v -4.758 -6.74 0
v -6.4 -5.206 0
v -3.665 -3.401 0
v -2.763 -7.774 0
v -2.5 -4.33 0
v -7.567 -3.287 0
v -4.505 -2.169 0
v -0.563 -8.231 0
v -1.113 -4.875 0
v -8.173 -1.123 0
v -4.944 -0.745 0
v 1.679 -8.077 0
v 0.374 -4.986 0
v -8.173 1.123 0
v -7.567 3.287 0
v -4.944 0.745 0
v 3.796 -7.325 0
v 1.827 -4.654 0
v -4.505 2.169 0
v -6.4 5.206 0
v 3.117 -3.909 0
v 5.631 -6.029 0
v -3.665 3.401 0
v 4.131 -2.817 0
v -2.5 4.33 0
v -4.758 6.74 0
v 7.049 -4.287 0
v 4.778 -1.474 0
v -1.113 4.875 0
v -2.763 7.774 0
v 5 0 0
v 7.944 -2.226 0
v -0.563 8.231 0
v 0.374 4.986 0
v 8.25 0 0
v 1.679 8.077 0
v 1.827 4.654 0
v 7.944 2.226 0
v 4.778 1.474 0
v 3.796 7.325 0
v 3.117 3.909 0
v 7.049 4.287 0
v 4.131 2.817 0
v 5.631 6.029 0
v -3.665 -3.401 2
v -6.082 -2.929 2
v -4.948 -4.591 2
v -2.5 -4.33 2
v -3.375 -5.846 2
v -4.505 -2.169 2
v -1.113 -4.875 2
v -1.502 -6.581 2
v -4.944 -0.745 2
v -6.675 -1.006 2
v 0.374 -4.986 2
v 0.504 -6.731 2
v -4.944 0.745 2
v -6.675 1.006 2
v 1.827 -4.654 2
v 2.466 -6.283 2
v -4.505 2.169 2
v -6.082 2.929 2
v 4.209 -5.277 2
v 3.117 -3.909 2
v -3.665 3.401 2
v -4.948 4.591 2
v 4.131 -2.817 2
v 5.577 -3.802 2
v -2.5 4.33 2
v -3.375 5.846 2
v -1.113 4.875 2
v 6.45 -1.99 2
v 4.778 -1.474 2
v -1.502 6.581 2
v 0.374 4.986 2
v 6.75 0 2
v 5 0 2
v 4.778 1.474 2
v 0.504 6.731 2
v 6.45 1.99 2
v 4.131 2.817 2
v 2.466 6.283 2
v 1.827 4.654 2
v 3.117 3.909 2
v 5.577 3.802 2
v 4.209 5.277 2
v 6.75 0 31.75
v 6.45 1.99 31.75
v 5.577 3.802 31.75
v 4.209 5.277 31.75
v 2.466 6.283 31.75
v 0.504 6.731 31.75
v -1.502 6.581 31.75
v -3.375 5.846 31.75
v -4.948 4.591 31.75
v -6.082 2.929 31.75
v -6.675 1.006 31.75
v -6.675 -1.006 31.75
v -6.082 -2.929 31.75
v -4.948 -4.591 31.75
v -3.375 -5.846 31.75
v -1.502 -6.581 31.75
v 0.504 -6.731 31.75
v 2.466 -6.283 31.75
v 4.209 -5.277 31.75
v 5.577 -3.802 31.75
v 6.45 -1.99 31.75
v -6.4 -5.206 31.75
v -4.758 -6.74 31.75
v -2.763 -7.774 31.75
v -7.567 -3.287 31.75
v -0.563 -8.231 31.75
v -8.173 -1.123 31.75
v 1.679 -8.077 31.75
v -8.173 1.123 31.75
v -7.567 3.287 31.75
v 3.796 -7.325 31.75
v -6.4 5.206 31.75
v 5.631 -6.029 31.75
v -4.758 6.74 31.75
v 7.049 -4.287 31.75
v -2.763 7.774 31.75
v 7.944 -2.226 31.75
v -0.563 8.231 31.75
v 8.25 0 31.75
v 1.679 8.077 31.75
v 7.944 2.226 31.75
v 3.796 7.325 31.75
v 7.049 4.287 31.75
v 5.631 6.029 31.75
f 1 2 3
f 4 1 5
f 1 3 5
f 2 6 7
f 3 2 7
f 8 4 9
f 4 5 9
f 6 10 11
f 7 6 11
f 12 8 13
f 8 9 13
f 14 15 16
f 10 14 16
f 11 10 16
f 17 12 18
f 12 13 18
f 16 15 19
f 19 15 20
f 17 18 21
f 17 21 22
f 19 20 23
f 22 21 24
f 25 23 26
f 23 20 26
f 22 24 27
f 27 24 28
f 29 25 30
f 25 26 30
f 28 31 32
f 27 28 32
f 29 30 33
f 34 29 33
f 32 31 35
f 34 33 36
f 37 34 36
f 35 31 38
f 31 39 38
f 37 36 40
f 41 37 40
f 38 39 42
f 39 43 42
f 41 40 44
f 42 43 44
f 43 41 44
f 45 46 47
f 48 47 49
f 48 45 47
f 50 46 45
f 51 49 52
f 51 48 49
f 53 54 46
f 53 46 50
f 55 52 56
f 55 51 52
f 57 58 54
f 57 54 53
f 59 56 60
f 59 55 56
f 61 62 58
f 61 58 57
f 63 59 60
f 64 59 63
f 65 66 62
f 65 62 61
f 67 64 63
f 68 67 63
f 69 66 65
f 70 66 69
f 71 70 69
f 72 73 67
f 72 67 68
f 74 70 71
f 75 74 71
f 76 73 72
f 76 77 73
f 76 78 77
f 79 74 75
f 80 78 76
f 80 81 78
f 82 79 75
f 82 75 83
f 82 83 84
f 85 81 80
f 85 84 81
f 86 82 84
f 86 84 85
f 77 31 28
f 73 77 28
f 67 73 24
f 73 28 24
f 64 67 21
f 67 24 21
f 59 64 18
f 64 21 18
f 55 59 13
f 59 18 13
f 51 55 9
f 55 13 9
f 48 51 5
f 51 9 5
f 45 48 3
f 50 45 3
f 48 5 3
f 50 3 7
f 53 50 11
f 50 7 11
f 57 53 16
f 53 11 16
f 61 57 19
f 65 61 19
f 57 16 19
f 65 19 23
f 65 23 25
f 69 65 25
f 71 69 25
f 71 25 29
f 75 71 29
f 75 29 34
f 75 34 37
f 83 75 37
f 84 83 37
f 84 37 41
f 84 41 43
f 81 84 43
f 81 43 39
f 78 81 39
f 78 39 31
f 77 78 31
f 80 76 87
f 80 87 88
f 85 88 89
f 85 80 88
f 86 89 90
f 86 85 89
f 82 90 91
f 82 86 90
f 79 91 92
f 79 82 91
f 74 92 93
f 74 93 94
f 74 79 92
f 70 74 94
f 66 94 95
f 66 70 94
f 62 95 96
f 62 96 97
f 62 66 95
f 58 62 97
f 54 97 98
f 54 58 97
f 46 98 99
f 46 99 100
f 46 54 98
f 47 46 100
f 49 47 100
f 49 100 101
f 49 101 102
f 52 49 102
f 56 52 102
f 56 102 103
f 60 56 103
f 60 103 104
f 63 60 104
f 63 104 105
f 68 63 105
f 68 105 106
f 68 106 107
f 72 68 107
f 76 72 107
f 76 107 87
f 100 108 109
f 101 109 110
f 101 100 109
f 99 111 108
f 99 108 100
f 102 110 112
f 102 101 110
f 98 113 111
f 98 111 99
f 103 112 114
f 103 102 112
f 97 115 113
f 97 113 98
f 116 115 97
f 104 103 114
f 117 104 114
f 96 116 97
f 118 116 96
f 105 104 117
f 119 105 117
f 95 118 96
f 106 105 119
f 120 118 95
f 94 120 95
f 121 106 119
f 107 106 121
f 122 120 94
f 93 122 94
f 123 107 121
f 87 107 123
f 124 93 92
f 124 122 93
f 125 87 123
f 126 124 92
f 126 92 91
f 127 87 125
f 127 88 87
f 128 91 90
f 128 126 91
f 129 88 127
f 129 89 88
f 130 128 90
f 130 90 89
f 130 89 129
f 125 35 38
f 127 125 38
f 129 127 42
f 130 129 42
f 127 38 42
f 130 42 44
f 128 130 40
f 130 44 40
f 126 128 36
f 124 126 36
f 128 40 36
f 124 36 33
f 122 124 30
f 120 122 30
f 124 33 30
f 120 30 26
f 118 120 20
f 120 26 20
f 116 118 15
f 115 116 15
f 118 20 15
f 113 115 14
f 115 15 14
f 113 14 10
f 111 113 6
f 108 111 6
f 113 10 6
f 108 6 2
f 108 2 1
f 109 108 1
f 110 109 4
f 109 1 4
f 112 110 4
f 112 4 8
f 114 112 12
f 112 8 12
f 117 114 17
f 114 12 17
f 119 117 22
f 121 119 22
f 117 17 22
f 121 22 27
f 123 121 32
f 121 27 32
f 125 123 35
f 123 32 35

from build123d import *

# Parameters (mm, degrees)
F0_R     = 8.25
F0_R_2   = 6.75
F1_DEPTH = 31.75
F2_R     = 8.076927
F3_DEPTH = 2
F4_R     = 5
F5_DEPTH = 25


with BuildPart() as f1:
    # F0 (on Top) → F1 (new body)
    with BuildSketch(Plane.XY):
        Circle(F0_R)
        Circle(F0_R_2, mode=Mode.SUBTRACT)
    extrude(amount=F1_DEPTH)

    # F2 (on Top) → F3 (join)
    with BuildSketch(Plane.XY):
        Circle(F2_R)
    extrude(amount=F3_DEPTH)

    # F4 (on face) → F5 (cut)
    with BuildSketch(Plane(origin=(0, 0, 0), x_dir=(1, 0, 0), z_dir=(0, 0, -1))):
        Circle(F4_R)
    extrude(amount=-F5_DEPTH, mode=Mode.SUBTRACT)


solid = f1.part
